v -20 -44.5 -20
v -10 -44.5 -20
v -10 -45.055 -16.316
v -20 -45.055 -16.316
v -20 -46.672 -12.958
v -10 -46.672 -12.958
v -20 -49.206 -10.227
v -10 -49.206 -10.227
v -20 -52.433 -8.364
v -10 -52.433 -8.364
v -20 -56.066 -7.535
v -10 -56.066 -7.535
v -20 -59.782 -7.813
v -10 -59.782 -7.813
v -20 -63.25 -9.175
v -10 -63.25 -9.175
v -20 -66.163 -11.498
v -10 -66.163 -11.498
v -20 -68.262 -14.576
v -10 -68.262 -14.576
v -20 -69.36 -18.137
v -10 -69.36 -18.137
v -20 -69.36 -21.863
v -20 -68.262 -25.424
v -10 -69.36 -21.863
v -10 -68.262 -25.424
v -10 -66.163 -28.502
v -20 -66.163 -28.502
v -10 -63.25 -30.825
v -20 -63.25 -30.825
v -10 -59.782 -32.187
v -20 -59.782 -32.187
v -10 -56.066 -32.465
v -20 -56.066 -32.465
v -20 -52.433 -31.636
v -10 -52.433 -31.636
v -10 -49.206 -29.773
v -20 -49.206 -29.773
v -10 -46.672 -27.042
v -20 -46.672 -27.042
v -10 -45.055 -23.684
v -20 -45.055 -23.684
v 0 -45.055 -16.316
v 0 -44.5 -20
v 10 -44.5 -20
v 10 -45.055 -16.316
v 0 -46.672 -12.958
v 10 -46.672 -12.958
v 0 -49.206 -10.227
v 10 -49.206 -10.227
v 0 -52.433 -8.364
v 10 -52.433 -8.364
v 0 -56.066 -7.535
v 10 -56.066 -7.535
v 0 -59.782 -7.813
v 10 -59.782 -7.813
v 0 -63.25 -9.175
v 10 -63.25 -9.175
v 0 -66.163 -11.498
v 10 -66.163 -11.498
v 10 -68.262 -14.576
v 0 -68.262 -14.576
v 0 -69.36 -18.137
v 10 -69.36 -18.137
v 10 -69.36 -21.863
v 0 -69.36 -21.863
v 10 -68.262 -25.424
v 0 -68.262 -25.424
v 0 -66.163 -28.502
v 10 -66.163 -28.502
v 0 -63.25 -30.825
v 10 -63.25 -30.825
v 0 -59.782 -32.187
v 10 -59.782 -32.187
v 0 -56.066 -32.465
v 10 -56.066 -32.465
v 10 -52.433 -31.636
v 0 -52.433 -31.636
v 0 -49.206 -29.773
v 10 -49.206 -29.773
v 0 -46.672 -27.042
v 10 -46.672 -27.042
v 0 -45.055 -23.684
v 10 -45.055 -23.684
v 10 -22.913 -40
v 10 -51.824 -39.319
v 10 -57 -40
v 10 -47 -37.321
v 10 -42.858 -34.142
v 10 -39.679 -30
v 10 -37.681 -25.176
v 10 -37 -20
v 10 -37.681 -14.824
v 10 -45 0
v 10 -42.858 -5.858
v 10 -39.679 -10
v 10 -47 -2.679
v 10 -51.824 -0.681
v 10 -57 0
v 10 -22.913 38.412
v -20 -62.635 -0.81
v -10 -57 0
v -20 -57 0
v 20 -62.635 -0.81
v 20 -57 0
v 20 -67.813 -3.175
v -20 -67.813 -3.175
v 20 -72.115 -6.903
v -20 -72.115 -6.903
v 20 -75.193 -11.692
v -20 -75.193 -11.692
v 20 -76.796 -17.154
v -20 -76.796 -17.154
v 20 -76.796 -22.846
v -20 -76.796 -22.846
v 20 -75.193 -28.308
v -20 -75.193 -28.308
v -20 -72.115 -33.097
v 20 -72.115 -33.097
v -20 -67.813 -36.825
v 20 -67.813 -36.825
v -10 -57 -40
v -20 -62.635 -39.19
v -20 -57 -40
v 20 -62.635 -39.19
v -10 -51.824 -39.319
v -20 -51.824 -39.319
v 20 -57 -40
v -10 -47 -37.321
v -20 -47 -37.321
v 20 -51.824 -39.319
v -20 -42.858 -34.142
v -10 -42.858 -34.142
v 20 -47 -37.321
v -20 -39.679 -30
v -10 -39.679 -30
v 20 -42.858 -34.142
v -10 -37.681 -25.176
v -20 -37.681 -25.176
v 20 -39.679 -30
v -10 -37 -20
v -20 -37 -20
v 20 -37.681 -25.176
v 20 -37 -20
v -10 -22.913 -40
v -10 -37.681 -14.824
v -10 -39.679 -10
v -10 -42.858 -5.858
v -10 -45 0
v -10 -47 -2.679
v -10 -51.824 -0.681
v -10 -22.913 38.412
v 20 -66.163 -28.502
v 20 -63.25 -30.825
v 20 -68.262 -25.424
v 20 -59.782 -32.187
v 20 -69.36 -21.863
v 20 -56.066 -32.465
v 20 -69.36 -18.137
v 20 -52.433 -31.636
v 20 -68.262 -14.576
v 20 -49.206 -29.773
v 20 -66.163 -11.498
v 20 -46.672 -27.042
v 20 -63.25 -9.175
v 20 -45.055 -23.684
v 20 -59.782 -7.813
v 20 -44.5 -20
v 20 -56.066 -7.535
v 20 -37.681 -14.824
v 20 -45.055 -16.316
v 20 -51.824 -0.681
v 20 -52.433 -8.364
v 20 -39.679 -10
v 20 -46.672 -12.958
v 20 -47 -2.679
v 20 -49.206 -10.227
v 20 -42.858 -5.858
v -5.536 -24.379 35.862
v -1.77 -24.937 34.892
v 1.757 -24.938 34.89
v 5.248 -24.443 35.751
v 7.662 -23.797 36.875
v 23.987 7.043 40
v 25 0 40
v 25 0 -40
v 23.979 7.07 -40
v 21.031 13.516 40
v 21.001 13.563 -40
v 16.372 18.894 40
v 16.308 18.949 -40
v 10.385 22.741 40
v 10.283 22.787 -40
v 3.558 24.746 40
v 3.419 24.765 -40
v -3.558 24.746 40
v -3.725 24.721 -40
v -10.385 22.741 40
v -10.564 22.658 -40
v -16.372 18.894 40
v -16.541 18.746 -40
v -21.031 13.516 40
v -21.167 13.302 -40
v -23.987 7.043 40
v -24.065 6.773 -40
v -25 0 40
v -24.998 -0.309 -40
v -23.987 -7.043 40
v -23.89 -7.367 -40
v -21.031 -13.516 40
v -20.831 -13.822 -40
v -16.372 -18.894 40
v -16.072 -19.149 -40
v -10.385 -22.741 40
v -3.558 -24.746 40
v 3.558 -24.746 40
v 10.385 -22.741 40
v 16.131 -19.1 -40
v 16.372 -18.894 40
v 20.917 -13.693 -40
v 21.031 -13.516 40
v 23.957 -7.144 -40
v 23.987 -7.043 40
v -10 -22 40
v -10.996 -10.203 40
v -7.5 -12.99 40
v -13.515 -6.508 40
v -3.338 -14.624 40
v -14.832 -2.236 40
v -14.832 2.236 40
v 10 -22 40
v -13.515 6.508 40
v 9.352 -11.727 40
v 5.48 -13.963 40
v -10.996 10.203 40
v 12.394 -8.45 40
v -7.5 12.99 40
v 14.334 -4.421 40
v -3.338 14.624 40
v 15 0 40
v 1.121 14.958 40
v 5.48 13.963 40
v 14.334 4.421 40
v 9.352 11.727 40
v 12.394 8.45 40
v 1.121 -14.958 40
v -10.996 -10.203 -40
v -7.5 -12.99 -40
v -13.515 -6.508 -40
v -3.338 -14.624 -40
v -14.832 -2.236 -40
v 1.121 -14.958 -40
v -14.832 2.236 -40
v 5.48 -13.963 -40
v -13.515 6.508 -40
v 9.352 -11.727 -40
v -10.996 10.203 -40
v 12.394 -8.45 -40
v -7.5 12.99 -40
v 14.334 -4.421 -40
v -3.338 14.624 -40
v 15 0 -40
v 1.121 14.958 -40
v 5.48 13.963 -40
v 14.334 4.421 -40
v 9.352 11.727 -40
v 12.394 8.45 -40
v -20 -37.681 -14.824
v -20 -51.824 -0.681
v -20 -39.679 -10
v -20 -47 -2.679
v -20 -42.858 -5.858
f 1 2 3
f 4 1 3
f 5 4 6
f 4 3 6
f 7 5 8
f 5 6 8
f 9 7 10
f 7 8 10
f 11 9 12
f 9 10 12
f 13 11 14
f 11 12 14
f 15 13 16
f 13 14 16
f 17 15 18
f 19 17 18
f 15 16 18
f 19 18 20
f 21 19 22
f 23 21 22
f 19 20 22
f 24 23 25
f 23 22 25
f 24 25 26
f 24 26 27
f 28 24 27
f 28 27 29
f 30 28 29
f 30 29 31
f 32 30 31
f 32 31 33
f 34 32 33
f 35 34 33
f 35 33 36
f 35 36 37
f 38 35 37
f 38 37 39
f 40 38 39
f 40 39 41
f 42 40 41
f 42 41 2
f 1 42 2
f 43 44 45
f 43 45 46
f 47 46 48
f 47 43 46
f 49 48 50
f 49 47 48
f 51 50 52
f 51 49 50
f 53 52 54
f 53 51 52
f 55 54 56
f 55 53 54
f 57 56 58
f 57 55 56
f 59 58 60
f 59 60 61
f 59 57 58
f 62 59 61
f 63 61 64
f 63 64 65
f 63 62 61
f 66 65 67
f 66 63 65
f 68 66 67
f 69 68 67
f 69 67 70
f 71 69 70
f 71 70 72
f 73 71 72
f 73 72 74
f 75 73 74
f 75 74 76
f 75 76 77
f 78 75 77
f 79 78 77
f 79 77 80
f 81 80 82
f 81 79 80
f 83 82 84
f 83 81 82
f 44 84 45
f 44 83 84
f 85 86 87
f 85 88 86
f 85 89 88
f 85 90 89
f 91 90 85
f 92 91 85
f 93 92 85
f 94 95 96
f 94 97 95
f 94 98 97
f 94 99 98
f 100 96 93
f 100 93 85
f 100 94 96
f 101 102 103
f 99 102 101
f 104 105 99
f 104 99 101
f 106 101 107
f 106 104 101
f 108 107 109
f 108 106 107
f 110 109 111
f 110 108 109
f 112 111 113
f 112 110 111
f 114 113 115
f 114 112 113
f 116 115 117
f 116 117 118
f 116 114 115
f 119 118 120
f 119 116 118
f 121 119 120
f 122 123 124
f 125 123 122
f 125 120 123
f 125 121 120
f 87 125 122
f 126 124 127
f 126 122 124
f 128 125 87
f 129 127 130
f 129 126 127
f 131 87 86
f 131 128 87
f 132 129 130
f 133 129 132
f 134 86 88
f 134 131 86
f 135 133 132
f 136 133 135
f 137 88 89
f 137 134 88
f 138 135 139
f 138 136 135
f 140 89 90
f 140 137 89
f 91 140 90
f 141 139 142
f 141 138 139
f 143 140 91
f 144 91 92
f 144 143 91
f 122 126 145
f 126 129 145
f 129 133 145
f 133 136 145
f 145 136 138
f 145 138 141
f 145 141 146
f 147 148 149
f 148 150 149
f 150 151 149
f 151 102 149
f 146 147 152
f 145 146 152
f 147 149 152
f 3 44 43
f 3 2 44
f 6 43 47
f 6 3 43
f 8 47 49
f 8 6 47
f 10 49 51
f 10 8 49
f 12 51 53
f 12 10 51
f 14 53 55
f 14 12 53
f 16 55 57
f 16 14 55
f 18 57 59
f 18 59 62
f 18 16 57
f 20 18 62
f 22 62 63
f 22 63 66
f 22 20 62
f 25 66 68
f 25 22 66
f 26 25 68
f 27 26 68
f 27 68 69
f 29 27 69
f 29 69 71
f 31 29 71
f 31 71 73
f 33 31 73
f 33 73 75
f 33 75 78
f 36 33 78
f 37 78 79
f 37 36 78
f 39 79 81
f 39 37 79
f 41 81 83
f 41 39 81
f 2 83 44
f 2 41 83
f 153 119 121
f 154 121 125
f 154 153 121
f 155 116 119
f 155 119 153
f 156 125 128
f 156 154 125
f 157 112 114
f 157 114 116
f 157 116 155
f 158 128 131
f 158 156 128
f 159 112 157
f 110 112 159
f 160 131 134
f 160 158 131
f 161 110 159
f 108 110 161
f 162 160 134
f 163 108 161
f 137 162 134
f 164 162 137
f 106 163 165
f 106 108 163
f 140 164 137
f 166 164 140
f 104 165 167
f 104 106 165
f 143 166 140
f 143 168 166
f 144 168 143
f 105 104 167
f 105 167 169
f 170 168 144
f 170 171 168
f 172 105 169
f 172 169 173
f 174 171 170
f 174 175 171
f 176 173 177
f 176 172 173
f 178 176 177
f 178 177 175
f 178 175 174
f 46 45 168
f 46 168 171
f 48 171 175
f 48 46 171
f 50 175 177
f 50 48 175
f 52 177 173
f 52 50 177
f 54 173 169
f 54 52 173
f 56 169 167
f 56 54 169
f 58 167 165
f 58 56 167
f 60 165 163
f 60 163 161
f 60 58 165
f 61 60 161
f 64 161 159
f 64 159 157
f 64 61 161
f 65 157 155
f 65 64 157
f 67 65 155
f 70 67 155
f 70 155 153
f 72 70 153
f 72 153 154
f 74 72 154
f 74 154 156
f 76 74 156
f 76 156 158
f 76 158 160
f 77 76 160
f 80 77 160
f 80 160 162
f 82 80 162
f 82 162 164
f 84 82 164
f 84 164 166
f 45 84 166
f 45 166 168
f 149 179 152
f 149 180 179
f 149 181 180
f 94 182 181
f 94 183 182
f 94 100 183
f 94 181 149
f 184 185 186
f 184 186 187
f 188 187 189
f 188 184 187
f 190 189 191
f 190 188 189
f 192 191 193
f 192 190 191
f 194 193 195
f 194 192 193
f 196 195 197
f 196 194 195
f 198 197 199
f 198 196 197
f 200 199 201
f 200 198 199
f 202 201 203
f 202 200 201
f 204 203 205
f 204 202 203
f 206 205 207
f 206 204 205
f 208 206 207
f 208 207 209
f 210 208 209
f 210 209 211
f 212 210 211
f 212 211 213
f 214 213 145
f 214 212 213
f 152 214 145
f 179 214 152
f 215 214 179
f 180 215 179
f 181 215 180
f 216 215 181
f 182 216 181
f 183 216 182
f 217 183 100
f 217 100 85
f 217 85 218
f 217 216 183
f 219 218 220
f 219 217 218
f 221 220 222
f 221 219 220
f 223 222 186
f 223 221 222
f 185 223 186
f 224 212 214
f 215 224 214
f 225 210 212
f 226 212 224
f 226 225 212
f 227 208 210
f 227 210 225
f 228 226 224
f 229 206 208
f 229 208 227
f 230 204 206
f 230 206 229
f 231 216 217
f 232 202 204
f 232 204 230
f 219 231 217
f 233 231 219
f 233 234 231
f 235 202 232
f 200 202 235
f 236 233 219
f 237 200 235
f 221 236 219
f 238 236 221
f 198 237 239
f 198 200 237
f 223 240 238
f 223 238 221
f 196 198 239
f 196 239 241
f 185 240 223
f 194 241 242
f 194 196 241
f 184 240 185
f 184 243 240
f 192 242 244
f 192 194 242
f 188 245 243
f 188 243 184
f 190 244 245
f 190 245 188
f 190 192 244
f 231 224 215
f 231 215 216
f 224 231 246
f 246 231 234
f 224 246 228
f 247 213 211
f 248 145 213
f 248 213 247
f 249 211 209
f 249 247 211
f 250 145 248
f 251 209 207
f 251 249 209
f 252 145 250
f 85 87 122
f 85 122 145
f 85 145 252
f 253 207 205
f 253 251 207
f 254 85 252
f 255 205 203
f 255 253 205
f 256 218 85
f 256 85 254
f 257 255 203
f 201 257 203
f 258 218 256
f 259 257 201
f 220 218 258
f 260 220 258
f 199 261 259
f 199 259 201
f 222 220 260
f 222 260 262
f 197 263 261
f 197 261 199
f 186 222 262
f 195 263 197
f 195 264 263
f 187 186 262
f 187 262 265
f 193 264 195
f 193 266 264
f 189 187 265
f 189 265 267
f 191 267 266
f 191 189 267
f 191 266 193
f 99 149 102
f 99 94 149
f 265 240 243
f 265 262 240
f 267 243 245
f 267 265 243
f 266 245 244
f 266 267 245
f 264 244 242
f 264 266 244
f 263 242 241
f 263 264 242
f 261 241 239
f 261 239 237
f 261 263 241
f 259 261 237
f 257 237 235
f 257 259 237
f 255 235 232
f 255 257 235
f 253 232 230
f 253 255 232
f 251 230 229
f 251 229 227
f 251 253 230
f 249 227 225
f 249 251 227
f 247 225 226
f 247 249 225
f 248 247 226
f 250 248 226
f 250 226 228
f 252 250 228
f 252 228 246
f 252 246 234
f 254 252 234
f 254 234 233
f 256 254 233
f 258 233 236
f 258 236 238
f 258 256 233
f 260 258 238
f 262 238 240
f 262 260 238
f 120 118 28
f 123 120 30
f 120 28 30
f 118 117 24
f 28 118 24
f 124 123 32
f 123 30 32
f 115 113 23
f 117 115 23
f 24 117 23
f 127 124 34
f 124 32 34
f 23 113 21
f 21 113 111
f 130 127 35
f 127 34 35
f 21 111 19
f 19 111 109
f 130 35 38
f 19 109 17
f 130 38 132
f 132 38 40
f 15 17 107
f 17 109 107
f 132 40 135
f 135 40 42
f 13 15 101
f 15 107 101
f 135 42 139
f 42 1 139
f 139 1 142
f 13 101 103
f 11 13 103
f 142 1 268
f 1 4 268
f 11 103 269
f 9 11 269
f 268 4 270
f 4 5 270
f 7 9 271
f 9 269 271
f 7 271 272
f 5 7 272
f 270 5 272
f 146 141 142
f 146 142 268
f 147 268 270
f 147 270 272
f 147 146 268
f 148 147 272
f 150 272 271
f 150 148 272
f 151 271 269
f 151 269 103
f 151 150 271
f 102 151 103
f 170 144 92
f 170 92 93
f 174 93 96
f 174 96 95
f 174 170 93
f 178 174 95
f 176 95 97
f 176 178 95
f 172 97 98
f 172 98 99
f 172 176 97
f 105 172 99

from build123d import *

# Parameters (mm, degrees)
F0_R     = 25
F0_R_2   = 15
F1_DEPTH = 40
F2_R     = 12.5
F3_DEPTH = 10
F4_DEPTH = 20


with BuildPart() as f1:
    # F0 (on Top) → F1 (new body, symmetric)
    with BuildSketch(Plane.XY):
        Circle(F0_R)
        Circle(F0_R_2, mode=Mode.SUBTRACT)
    extrude(amount=F1_DEPTH, both=True)

    # F2 (on Right) → F3 (join, symmetric)
    with BuildSketch(Plane.YZ):
        with BuildLine():
            ThreePointArc((-57, -40), (-42.8578643763, -34.1421356237), (-37, -20))
            ThreePointArc((-37, -20), (-42.8578643763, -5.8578643763), (-57, 0))
            ThreePointArc((-57, 0), (-77, -20), (-57, -40))
        make_face()
        with Locations((-57, -20)):
            Circle(F2_R, mode=Mode.SUBTRACT)
        with BuildLine():
            ThreePointArc((-57, 0), (-42.8578643763, -5.8578643763), (-37, -20))
            ThreePointArc((-37, -20), (-42.8578643763, -34.1421356237), (-57, -40))
            Line((-57, -40), (-22, -40))
            Line((-22, -40), (-22, 0))
            Line((-22, 0), (-45, 0))
            Line((-45, 0), (-57, 0))
        make_face()
        Polygon((-22, 40), (-45, 0), (-22, 0), align=None)
    extrude(amount=F3_DEPTH, both=True)

    # F2 (on Right) → F4 (join, symmetric)
    with BuildSketch(Plane.YZ):
        with BuildLine():
            ThreePointArc((-57, -40), (-42.8578643763, -34.1421356237), (-37, -20))
            ThreePointArc((-37, -20), (-42.8578643763, -5.8578643763), (-57, 0))
            ThreePointArc((-57, 0), (-77, -20), (-57, -40))
        make_face()
        with Locations((-57, -20)):
            Circle(F2_R, mode=Mode.SUBTRACT)
    extrude(amount=F4_DEPTH, both=True)


solid = f1.part
